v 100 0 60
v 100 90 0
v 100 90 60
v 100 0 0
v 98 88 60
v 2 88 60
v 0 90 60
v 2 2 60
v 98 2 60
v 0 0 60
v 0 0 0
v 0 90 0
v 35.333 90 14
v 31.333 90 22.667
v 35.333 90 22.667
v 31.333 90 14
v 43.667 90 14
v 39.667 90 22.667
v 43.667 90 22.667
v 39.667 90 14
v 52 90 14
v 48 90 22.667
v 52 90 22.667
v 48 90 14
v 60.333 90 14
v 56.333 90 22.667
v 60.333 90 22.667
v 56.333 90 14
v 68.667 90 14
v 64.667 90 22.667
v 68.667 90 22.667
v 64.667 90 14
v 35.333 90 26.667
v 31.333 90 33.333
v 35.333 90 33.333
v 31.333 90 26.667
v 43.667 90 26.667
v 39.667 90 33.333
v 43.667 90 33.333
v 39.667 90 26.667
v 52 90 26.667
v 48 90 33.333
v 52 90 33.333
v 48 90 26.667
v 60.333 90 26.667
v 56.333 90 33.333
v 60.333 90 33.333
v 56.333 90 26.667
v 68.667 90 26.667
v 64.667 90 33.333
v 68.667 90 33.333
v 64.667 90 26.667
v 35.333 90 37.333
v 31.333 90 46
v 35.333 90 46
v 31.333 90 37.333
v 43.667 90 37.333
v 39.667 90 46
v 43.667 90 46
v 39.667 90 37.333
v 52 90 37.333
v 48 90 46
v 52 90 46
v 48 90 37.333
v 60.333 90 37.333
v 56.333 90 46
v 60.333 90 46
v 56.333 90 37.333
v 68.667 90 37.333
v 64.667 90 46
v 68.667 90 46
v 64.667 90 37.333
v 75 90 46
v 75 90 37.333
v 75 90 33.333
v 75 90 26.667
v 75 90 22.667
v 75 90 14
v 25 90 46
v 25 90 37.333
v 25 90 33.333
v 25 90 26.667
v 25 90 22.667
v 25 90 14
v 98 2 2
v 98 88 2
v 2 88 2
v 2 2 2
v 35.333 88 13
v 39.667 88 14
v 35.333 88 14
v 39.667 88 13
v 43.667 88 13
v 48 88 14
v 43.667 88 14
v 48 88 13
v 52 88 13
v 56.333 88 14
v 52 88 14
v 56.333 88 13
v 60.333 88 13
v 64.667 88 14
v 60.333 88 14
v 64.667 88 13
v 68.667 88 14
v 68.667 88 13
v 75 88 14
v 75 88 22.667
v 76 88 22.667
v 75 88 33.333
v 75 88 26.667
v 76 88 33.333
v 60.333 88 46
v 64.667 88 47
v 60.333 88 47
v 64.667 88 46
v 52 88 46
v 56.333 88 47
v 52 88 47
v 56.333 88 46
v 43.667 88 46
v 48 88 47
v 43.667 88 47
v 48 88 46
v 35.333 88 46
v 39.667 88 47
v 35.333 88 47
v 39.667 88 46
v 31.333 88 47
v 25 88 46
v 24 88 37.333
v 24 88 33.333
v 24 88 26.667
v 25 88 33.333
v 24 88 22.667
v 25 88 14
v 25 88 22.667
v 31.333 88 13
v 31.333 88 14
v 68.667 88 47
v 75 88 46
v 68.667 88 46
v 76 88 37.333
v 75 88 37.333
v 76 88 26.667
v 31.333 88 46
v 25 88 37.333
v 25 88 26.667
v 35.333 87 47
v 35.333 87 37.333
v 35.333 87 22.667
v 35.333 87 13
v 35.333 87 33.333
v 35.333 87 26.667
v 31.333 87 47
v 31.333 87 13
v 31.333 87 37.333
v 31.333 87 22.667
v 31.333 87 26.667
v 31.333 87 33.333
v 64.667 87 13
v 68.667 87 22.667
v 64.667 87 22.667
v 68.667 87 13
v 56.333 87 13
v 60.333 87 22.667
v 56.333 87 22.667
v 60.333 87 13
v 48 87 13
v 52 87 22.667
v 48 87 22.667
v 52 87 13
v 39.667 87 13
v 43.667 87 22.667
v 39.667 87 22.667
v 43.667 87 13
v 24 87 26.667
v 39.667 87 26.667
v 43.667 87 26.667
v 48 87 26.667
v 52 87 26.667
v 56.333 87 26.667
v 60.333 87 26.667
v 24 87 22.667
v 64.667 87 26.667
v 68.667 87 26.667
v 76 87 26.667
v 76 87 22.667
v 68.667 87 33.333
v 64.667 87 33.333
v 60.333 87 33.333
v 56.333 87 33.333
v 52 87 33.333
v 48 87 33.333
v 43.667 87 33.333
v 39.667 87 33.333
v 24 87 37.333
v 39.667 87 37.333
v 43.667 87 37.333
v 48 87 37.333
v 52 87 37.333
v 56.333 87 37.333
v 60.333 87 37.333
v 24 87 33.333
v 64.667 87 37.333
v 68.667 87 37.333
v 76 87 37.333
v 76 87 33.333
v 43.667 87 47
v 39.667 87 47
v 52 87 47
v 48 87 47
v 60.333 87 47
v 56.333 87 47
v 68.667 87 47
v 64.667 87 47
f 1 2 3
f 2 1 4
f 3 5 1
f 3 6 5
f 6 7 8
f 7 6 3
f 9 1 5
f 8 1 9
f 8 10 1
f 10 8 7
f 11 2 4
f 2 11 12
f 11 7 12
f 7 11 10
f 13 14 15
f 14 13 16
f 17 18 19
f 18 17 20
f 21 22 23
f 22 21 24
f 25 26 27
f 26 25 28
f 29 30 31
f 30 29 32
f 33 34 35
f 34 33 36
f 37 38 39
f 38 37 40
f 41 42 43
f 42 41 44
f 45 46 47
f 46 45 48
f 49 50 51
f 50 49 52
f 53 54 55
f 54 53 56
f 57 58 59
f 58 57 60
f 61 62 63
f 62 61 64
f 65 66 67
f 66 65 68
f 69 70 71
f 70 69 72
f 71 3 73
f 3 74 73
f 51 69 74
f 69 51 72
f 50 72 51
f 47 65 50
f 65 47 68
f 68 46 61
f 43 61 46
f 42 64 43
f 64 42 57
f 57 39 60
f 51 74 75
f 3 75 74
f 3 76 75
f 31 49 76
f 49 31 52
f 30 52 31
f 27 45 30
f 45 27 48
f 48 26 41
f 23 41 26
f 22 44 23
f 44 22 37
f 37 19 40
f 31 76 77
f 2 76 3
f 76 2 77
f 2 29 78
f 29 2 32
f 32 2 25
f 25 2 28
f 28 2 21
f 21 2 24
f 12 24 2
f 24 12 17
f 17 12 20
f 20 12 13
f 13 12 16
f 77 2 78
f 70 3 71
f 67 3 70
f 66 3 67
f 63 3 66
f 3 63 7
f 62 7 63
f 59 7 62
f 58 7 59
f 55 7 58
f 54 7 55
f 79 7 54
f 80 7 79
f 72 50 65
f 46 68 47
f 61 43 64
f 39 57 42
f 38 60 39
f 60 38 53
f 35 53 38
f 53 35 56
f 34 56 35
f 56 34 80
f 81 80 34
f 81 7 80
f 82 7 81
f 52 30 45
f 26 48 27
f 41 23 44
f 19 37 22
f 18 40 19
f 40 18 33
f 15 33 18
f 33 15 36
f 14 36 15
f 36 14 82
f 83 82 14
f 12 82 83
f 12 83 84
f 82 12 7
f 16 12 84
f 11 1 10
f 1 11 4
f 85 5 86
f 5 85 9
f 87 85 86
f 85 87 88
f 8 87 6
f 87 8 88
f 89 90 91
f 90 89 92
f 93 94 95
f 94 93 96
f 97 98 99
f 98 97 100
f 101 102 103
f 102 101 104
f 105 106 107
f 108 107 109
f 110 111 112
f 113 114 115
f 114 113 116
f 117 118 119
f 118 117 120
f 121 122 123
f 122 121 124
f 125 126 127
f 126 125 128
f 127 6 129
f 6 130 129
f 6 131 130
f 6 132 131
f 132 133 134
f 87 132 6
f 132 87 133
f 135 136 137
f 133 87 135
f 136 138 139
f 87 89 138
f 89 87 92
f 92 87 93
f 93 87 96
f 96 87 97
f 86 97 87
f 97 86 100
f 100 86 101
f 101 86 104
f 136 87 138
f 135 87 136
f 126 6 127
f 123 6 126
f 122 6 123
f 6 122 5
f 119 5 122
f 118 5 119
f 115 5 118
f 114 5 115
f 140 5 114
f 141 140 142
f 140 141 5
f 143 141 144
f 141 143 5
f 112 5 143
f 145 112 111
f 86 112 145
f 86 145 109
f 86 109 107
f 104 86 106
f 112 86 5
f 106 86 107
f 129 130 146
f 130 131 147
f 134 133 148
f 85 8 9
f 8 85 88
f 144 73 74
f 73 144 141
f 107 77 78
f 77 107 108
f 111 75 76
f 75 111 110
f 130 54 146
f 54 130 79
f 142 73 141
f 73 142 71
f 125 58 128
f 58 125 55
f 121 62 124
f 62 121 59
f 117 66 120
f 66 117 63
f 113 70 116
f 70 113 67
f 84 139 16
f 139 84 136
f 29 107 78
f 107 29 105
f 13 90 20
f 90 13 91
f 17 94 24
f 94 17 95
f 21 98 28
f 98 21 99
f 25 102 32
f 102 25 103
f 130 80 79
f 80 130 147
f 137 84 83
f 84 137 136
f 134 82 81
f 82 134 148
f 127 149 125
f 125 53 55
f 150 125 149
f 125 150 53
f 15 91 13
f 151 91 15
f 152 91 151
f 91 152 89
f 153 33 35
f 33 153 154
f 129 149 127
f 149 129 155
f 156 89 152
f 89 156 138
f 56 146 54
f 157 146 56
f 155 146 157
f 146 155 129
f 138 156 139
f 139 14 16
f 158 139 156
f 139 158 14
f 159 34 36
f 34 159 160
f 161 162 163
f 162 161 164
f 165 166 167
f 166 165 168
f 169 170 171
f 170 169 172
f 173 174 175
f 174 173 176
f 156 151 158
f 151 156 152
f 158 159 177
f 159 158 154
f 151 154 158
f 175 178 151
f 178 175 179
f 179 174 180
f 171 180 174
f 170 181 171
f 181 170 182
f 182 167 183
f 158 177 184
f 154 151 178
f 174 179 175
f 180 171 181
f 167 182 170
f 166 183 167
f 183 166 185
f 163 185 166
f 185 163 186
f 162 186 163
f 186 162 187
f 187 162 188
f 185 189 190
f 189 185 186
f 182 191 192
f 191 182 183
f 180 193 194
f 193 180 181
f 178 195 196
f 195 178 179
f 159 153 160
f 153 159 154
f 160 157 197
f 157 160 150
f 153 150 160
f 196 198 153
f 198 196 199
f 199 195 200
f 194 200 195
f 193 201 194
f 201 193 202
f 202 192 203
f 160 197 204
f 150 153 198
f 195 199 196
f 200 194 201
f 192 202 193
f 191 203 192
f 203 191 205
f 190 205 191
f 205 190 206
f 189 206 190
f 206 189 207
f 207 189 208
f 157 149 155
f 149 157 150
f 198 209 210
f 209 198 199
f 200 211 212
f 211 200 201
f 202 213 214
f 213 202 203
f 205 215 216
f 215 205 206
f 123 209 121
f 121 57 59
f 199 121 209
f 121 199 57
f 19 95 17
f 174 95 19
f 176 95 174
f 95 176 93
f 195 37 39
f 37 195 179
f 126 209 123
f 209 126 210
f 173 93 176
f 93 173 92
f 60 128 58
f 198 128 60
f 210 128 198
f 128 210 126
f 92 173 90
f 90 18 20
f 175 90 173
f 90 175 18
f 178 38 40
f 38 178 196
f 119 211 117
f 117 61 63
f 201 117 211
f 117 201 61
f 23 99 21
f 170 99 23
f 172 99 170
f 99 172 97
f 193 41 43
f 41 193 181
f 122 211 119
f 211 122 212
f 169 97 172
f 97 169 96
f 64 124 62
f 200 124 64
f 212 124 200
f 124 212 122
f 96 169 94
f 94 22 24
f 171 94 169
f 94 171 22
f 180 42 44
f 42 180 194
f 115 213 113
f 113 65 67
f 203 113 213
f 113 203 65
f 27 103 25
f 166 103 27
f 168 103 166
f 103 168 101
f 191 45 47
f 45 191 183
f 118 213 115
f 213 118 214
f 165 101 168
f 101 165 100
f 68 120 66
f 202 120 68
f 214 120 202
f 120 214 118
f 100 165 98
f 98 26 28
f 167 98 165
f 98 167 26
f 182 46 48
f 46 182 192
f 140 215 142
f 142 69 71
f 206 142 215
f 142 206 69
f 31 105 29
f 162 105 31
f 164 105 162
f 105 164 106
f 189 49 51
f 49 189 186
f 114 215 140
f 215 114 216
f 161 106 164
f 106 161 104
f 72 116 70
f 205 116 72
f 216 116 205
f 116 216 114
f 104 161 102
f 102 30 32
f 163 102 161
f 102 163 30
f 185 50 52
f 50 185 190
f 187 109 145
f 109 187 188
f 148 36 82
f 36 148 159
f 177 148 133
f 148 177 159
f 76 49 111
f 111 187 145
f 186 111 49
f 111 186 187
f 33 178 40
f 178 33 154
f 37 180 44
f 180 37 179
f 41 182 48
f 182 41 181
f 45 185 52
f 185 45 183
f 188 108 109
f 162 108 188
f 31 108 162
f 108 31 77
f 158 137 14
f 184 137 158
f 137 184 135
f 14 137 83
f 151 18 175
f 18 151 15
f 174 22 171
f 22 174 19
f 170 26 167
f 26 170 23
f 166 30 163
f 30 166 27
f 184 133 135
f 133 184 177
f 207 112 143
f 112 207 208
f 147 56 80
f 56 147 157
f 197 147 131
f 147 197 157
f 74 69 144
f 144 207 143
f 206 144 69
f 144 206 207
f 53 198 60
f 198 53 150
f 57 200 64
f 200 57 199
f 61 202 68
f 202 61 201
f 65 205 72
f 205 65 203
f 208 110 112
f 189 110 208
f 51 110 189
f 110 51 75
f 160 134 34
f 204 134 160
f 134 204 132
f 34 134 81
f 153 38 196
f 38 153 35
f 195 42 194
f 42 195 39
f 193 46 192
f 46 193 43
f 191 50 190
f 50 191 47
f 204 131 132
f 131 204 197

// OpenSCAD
$fn = 32;

// ----------------------------------------------------------------------
// Vent box: crossgrid enclosure
// ----------------------------------------------------------------------

// --- parameters (mm) ---
box_l = 100;              // box length, X
box_w = 90;               // box width, Y
box_h = 60;               // box height, Z
wall_t = 2;               // shell wall thickness
win_l = 50;               // vent window width, X
win_h = 32;               // vent window height, Z
bar_w = 4;                // grid bar width
n_v = 5;                  // vertical bar count
n_h = 2;                  // horizontal bar count

win_z0 = (box_h - win_h) / 2;  // window lower edge Z
v_step = win_l / (n_v + 1);  // vertical bar step
h_step = win_h / (n_h + 1);  // horizontal bar step

difference() {
  union() {
    difference() {
      cube([box_l, box_w, box_h]);
  translate([wall_t, wall_t, wall_t])
    cube([box_l - 2 * wall_t, box_w - 2 * wall_t, box_h]);
  translate([(box_l - win_l) / 2, box_w - wall_t - 1, win_z0])
    cube([win_l, wall_t + 2, win_h]);
    }
    for (i = [1 : n_v])
      translate([(box_l - win_l) / 2 + i * v_step - bar_w / 2,
                 box_w - wall_t - 1, win_z0 - 1])
        cube([bar_w, wall_t + 1, win_h + 2]);
    for (i = [1 : n_h])
      translate([(box_l - win_l) / 2 - 1, box_w - wall_t - 1,
                 win_z0 + i * h_step - bar_w / 2])
        cube([win_l + 2, wall_t + 1, bar_w]);
  }
}
